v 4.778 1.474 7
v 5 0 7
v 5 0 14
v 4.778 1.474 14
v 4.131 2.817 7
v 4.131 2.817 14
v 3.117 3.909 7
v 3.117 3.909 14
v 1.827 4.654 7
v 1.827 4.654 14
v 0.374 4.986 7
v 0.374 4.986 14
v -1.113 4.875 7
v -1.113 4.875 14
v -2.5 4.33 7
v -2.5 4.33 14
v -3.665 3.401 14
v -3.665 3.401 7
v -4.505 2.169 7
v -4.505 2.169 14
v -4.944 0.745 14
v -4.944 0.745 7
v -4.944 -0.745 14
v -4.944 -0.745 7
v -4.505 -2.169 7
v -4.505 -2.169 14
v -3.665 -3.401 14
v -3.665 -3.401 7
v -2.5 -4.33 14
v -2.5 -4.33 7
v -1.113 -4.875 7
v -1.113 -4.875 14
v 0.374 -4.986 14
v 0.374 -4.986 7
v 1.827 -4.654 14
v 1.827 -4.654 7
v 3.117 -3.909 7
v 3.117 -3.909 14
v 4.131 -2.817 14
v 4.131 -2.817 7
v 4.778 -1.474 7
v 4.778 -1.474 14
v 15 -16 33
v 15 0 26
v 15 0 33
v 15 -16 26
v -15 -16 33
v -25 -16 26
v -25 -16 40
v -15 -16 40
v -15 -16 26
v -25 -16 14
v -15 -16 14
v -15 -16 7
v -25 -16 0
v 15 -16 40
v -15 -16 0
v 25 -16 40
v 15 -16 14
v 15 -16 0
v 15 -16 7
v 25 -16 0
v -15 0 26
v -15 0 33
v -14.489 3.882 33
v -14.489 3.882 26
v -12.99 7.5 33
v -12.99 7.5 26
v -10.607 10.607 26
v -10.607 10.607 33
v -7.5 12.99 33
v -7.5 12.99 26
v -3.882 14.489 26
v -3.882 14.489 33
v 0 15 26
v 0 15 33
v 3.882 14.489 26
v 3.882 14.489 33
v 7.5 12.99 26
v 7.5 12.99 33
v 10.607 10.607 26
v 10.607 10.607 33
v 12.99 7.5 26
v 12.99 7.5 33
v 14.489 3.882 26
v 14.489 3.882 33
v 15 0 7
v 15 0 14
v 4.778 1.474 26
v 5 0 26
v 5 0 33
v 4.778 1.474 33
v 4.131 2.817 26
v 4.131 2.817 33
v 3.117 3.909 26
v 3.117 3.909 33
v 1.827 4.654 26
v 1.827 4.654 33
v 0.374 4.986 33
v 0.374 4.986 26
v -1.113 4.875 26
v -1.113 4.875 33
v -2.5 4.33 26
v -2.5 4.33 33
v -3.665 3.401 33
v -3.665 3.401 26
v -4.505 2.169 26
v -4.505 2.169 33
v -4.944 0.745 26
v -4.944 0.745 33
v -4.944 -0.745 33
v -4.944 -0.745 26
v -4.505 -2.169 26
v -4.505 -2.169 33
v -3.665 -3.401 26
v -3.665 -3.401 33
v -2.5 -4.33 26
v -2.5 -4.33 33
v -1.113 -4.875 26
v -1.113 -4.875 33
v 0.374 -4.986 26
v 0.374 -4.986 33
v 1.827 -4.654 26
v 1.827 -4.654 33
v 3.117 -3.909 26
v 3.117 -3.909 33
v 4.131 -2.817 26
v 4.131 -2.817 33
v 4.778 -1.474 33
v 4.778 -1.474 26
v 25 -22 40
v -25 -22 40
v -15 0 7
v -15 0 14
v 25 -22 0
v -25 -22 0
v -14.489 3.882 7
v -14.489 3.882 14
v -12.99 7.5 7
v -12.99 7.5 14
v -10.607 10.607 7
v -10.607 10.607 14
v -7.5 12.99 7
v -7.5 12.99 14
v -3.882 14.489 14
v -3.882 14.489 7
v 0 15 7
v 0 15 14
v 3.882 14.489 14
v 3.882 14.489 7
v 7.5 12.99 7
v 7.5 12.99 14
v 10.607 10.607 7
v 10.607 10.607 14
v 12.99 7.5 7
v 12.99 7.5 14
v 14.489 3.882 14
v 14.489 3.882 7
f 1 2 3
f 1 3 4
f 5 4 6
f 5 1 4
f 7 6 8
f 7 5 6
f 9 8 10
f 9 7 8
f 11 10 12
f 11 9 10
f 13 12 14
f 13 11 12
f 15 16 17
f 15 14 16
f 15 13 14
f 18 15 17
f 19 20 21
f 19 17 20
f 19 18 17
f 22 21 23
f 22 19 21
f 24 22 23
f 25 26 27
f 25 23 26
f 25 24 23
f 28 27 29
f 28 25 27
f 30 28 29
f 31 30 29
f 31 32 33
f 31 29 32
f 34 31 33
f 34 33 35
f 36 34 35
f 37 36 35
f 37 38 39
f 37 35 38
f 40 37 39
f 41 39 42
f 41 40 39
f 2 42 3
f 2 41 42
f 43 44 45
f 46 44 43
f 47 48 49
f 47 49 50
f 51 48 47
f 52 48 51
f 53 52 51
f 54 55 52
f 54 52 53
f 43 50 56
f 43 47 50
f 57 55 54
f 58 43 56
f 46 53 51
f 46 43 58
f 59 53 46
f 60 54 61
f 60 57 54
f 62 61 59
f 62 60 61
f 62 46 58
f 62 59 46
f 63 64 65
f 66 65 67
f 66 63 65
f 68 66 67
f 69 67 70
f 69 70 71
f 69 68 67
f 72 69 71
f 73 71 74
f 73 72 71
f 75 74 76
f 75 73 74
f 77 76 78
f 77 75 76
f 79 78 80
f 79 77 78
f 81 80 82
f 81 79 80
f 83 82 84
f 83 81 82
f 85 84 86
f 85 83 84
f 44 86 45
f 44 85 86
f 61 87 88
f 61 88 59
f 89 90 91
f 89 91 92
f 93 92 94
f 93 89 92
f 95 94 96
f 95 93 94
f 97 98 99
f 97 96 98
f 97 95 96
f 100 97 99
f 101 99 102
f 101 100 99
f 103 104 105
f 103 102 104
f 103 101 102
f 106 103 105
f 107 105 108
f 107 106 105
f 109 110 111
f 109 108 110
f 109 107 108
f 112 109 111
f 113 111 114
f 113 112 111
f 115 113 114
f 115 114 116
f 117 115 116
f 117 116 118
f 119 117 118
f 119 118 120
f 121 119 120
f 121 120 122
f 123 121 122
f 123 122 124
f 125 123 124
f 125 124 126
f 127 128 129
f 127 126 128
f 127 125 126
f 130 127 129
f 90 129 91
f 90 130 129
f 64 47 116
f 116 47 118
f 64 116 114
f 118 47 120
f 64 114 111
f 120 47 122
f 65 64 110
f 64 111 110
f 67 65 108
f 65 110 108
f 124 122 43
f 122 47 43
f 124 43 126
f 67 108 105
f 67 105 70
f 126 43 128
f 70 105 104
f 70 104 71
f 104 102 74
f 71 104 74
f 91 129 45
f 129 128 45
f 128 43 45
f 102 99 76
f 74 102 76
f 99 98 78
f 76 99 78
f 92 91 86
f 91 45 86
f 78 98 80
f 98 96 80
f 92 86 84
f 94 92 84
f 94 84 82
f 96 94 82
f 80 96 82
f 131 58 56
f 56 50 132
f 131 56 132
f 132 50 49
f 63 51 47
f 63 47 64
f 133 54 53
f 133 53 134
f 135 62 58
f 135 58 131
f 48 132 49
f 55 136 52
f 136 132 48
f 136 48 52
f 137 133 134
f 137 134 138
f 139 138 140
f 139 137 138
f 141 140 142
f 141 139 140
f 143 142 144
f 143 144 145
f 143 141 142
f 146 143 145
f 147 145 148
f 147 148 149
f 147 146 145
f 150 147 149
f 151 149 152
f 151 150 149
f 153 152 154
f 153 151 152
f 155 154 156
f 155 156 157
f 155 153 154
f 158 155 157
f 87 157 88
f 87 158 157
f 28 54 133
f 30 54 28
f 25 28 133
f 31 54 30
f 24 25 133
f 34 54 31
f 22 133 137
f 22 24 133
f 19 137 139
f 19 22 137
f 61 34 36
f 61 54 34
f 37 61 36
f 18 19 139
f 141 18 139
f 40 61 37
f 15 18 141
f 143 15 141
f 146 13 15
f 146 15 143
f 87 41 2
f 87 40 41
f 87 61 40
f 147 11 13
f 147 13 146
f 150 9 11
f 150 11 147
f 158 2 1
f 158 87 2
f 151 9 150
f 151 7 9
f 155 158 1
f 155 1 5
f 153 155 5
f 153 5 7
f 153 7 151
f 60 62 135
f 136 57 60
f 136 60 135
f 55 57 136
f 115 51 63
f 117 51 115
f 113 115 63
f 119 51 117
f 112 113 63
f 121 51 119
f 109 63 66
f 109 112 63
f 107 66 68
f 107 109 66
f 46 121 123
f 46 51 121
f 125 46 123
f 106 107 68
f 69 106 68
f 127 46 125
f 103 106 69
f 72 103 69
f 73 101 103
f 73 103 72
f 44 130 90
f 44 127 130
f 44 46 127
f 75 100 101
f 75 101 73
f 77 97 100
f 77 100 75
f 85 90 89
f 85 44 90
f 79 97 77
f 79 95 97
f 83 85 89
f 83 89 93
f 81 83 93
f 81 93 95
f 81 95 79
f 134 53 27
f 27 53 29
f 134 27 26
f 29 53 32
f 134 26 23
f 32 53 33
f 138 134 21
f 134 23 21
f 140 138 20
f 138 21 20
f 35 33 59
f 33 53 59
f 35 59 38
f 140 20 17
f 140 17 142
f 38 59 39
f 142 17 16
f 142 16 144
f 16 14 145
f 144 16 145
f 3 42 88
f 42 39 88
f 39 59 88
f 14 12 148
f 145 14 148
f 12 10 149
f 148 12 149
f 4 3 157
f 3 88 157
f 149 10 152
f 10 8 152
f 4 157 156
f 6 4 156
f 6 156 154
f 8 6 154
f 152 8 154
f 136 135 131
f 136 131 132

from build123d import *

# Parameters (mm, degrees)
SKETCH1_R          = 5
EXTRUDE1_DEPTH     = 40
SKETCH2_W          = 7
SKETCH2_H          = 34.499518557
SKETCH2_W_2        = 12
CUT_EXTRUDE1_DEPTH = 40


with BuildPart() as part:
    # Sketch1 → Extrude1 (new body)
    with BuildSketch(Plane.XY):
        with BuildLine():
            Line((15, -16), (25, -16))
            Line((25, -16), (25, -22))
            Line((25, -22), (-25, -22))
            Line((-25, -22), (-25, -16))
            Line((-25, -16), (-15, -16))
            Line((-15, -16), (-15, 0))
            ThreePointArc((-15, 0), (0, 15), (15, 0))
            Line((15, 0), (15, -16))
        make_face()
        Circle(SKETCH1_R, mode=Mode.SUBTRACT)
    extrude(amount=EXTRUDE1_DEPTH)

    # Sketch2 → Cut-Extrude1 (cut)
    with BuildSketch(Plane(origin=(15, 0, 0), x_dir=(0, 0, -1), z_dir=(1, 0, 0))):
        with Locations((-36.5, 1.249759279)):
            Rectangle(SKETCH2_W, SKETCH2_H)
        with Locations((-3.5, 1.249759279)):
            Rectangle(SKETCH2_W, SKETCH2_H)
        with Locations((-20, 1.249759279)):
            Rectangle(SKETCH2_W_2, SKETCH2_H)
    extrude(amount=-CUT_EXTRUDE1_DEPTH, mode=Mode.SUBTRACT)


solid = part.part
